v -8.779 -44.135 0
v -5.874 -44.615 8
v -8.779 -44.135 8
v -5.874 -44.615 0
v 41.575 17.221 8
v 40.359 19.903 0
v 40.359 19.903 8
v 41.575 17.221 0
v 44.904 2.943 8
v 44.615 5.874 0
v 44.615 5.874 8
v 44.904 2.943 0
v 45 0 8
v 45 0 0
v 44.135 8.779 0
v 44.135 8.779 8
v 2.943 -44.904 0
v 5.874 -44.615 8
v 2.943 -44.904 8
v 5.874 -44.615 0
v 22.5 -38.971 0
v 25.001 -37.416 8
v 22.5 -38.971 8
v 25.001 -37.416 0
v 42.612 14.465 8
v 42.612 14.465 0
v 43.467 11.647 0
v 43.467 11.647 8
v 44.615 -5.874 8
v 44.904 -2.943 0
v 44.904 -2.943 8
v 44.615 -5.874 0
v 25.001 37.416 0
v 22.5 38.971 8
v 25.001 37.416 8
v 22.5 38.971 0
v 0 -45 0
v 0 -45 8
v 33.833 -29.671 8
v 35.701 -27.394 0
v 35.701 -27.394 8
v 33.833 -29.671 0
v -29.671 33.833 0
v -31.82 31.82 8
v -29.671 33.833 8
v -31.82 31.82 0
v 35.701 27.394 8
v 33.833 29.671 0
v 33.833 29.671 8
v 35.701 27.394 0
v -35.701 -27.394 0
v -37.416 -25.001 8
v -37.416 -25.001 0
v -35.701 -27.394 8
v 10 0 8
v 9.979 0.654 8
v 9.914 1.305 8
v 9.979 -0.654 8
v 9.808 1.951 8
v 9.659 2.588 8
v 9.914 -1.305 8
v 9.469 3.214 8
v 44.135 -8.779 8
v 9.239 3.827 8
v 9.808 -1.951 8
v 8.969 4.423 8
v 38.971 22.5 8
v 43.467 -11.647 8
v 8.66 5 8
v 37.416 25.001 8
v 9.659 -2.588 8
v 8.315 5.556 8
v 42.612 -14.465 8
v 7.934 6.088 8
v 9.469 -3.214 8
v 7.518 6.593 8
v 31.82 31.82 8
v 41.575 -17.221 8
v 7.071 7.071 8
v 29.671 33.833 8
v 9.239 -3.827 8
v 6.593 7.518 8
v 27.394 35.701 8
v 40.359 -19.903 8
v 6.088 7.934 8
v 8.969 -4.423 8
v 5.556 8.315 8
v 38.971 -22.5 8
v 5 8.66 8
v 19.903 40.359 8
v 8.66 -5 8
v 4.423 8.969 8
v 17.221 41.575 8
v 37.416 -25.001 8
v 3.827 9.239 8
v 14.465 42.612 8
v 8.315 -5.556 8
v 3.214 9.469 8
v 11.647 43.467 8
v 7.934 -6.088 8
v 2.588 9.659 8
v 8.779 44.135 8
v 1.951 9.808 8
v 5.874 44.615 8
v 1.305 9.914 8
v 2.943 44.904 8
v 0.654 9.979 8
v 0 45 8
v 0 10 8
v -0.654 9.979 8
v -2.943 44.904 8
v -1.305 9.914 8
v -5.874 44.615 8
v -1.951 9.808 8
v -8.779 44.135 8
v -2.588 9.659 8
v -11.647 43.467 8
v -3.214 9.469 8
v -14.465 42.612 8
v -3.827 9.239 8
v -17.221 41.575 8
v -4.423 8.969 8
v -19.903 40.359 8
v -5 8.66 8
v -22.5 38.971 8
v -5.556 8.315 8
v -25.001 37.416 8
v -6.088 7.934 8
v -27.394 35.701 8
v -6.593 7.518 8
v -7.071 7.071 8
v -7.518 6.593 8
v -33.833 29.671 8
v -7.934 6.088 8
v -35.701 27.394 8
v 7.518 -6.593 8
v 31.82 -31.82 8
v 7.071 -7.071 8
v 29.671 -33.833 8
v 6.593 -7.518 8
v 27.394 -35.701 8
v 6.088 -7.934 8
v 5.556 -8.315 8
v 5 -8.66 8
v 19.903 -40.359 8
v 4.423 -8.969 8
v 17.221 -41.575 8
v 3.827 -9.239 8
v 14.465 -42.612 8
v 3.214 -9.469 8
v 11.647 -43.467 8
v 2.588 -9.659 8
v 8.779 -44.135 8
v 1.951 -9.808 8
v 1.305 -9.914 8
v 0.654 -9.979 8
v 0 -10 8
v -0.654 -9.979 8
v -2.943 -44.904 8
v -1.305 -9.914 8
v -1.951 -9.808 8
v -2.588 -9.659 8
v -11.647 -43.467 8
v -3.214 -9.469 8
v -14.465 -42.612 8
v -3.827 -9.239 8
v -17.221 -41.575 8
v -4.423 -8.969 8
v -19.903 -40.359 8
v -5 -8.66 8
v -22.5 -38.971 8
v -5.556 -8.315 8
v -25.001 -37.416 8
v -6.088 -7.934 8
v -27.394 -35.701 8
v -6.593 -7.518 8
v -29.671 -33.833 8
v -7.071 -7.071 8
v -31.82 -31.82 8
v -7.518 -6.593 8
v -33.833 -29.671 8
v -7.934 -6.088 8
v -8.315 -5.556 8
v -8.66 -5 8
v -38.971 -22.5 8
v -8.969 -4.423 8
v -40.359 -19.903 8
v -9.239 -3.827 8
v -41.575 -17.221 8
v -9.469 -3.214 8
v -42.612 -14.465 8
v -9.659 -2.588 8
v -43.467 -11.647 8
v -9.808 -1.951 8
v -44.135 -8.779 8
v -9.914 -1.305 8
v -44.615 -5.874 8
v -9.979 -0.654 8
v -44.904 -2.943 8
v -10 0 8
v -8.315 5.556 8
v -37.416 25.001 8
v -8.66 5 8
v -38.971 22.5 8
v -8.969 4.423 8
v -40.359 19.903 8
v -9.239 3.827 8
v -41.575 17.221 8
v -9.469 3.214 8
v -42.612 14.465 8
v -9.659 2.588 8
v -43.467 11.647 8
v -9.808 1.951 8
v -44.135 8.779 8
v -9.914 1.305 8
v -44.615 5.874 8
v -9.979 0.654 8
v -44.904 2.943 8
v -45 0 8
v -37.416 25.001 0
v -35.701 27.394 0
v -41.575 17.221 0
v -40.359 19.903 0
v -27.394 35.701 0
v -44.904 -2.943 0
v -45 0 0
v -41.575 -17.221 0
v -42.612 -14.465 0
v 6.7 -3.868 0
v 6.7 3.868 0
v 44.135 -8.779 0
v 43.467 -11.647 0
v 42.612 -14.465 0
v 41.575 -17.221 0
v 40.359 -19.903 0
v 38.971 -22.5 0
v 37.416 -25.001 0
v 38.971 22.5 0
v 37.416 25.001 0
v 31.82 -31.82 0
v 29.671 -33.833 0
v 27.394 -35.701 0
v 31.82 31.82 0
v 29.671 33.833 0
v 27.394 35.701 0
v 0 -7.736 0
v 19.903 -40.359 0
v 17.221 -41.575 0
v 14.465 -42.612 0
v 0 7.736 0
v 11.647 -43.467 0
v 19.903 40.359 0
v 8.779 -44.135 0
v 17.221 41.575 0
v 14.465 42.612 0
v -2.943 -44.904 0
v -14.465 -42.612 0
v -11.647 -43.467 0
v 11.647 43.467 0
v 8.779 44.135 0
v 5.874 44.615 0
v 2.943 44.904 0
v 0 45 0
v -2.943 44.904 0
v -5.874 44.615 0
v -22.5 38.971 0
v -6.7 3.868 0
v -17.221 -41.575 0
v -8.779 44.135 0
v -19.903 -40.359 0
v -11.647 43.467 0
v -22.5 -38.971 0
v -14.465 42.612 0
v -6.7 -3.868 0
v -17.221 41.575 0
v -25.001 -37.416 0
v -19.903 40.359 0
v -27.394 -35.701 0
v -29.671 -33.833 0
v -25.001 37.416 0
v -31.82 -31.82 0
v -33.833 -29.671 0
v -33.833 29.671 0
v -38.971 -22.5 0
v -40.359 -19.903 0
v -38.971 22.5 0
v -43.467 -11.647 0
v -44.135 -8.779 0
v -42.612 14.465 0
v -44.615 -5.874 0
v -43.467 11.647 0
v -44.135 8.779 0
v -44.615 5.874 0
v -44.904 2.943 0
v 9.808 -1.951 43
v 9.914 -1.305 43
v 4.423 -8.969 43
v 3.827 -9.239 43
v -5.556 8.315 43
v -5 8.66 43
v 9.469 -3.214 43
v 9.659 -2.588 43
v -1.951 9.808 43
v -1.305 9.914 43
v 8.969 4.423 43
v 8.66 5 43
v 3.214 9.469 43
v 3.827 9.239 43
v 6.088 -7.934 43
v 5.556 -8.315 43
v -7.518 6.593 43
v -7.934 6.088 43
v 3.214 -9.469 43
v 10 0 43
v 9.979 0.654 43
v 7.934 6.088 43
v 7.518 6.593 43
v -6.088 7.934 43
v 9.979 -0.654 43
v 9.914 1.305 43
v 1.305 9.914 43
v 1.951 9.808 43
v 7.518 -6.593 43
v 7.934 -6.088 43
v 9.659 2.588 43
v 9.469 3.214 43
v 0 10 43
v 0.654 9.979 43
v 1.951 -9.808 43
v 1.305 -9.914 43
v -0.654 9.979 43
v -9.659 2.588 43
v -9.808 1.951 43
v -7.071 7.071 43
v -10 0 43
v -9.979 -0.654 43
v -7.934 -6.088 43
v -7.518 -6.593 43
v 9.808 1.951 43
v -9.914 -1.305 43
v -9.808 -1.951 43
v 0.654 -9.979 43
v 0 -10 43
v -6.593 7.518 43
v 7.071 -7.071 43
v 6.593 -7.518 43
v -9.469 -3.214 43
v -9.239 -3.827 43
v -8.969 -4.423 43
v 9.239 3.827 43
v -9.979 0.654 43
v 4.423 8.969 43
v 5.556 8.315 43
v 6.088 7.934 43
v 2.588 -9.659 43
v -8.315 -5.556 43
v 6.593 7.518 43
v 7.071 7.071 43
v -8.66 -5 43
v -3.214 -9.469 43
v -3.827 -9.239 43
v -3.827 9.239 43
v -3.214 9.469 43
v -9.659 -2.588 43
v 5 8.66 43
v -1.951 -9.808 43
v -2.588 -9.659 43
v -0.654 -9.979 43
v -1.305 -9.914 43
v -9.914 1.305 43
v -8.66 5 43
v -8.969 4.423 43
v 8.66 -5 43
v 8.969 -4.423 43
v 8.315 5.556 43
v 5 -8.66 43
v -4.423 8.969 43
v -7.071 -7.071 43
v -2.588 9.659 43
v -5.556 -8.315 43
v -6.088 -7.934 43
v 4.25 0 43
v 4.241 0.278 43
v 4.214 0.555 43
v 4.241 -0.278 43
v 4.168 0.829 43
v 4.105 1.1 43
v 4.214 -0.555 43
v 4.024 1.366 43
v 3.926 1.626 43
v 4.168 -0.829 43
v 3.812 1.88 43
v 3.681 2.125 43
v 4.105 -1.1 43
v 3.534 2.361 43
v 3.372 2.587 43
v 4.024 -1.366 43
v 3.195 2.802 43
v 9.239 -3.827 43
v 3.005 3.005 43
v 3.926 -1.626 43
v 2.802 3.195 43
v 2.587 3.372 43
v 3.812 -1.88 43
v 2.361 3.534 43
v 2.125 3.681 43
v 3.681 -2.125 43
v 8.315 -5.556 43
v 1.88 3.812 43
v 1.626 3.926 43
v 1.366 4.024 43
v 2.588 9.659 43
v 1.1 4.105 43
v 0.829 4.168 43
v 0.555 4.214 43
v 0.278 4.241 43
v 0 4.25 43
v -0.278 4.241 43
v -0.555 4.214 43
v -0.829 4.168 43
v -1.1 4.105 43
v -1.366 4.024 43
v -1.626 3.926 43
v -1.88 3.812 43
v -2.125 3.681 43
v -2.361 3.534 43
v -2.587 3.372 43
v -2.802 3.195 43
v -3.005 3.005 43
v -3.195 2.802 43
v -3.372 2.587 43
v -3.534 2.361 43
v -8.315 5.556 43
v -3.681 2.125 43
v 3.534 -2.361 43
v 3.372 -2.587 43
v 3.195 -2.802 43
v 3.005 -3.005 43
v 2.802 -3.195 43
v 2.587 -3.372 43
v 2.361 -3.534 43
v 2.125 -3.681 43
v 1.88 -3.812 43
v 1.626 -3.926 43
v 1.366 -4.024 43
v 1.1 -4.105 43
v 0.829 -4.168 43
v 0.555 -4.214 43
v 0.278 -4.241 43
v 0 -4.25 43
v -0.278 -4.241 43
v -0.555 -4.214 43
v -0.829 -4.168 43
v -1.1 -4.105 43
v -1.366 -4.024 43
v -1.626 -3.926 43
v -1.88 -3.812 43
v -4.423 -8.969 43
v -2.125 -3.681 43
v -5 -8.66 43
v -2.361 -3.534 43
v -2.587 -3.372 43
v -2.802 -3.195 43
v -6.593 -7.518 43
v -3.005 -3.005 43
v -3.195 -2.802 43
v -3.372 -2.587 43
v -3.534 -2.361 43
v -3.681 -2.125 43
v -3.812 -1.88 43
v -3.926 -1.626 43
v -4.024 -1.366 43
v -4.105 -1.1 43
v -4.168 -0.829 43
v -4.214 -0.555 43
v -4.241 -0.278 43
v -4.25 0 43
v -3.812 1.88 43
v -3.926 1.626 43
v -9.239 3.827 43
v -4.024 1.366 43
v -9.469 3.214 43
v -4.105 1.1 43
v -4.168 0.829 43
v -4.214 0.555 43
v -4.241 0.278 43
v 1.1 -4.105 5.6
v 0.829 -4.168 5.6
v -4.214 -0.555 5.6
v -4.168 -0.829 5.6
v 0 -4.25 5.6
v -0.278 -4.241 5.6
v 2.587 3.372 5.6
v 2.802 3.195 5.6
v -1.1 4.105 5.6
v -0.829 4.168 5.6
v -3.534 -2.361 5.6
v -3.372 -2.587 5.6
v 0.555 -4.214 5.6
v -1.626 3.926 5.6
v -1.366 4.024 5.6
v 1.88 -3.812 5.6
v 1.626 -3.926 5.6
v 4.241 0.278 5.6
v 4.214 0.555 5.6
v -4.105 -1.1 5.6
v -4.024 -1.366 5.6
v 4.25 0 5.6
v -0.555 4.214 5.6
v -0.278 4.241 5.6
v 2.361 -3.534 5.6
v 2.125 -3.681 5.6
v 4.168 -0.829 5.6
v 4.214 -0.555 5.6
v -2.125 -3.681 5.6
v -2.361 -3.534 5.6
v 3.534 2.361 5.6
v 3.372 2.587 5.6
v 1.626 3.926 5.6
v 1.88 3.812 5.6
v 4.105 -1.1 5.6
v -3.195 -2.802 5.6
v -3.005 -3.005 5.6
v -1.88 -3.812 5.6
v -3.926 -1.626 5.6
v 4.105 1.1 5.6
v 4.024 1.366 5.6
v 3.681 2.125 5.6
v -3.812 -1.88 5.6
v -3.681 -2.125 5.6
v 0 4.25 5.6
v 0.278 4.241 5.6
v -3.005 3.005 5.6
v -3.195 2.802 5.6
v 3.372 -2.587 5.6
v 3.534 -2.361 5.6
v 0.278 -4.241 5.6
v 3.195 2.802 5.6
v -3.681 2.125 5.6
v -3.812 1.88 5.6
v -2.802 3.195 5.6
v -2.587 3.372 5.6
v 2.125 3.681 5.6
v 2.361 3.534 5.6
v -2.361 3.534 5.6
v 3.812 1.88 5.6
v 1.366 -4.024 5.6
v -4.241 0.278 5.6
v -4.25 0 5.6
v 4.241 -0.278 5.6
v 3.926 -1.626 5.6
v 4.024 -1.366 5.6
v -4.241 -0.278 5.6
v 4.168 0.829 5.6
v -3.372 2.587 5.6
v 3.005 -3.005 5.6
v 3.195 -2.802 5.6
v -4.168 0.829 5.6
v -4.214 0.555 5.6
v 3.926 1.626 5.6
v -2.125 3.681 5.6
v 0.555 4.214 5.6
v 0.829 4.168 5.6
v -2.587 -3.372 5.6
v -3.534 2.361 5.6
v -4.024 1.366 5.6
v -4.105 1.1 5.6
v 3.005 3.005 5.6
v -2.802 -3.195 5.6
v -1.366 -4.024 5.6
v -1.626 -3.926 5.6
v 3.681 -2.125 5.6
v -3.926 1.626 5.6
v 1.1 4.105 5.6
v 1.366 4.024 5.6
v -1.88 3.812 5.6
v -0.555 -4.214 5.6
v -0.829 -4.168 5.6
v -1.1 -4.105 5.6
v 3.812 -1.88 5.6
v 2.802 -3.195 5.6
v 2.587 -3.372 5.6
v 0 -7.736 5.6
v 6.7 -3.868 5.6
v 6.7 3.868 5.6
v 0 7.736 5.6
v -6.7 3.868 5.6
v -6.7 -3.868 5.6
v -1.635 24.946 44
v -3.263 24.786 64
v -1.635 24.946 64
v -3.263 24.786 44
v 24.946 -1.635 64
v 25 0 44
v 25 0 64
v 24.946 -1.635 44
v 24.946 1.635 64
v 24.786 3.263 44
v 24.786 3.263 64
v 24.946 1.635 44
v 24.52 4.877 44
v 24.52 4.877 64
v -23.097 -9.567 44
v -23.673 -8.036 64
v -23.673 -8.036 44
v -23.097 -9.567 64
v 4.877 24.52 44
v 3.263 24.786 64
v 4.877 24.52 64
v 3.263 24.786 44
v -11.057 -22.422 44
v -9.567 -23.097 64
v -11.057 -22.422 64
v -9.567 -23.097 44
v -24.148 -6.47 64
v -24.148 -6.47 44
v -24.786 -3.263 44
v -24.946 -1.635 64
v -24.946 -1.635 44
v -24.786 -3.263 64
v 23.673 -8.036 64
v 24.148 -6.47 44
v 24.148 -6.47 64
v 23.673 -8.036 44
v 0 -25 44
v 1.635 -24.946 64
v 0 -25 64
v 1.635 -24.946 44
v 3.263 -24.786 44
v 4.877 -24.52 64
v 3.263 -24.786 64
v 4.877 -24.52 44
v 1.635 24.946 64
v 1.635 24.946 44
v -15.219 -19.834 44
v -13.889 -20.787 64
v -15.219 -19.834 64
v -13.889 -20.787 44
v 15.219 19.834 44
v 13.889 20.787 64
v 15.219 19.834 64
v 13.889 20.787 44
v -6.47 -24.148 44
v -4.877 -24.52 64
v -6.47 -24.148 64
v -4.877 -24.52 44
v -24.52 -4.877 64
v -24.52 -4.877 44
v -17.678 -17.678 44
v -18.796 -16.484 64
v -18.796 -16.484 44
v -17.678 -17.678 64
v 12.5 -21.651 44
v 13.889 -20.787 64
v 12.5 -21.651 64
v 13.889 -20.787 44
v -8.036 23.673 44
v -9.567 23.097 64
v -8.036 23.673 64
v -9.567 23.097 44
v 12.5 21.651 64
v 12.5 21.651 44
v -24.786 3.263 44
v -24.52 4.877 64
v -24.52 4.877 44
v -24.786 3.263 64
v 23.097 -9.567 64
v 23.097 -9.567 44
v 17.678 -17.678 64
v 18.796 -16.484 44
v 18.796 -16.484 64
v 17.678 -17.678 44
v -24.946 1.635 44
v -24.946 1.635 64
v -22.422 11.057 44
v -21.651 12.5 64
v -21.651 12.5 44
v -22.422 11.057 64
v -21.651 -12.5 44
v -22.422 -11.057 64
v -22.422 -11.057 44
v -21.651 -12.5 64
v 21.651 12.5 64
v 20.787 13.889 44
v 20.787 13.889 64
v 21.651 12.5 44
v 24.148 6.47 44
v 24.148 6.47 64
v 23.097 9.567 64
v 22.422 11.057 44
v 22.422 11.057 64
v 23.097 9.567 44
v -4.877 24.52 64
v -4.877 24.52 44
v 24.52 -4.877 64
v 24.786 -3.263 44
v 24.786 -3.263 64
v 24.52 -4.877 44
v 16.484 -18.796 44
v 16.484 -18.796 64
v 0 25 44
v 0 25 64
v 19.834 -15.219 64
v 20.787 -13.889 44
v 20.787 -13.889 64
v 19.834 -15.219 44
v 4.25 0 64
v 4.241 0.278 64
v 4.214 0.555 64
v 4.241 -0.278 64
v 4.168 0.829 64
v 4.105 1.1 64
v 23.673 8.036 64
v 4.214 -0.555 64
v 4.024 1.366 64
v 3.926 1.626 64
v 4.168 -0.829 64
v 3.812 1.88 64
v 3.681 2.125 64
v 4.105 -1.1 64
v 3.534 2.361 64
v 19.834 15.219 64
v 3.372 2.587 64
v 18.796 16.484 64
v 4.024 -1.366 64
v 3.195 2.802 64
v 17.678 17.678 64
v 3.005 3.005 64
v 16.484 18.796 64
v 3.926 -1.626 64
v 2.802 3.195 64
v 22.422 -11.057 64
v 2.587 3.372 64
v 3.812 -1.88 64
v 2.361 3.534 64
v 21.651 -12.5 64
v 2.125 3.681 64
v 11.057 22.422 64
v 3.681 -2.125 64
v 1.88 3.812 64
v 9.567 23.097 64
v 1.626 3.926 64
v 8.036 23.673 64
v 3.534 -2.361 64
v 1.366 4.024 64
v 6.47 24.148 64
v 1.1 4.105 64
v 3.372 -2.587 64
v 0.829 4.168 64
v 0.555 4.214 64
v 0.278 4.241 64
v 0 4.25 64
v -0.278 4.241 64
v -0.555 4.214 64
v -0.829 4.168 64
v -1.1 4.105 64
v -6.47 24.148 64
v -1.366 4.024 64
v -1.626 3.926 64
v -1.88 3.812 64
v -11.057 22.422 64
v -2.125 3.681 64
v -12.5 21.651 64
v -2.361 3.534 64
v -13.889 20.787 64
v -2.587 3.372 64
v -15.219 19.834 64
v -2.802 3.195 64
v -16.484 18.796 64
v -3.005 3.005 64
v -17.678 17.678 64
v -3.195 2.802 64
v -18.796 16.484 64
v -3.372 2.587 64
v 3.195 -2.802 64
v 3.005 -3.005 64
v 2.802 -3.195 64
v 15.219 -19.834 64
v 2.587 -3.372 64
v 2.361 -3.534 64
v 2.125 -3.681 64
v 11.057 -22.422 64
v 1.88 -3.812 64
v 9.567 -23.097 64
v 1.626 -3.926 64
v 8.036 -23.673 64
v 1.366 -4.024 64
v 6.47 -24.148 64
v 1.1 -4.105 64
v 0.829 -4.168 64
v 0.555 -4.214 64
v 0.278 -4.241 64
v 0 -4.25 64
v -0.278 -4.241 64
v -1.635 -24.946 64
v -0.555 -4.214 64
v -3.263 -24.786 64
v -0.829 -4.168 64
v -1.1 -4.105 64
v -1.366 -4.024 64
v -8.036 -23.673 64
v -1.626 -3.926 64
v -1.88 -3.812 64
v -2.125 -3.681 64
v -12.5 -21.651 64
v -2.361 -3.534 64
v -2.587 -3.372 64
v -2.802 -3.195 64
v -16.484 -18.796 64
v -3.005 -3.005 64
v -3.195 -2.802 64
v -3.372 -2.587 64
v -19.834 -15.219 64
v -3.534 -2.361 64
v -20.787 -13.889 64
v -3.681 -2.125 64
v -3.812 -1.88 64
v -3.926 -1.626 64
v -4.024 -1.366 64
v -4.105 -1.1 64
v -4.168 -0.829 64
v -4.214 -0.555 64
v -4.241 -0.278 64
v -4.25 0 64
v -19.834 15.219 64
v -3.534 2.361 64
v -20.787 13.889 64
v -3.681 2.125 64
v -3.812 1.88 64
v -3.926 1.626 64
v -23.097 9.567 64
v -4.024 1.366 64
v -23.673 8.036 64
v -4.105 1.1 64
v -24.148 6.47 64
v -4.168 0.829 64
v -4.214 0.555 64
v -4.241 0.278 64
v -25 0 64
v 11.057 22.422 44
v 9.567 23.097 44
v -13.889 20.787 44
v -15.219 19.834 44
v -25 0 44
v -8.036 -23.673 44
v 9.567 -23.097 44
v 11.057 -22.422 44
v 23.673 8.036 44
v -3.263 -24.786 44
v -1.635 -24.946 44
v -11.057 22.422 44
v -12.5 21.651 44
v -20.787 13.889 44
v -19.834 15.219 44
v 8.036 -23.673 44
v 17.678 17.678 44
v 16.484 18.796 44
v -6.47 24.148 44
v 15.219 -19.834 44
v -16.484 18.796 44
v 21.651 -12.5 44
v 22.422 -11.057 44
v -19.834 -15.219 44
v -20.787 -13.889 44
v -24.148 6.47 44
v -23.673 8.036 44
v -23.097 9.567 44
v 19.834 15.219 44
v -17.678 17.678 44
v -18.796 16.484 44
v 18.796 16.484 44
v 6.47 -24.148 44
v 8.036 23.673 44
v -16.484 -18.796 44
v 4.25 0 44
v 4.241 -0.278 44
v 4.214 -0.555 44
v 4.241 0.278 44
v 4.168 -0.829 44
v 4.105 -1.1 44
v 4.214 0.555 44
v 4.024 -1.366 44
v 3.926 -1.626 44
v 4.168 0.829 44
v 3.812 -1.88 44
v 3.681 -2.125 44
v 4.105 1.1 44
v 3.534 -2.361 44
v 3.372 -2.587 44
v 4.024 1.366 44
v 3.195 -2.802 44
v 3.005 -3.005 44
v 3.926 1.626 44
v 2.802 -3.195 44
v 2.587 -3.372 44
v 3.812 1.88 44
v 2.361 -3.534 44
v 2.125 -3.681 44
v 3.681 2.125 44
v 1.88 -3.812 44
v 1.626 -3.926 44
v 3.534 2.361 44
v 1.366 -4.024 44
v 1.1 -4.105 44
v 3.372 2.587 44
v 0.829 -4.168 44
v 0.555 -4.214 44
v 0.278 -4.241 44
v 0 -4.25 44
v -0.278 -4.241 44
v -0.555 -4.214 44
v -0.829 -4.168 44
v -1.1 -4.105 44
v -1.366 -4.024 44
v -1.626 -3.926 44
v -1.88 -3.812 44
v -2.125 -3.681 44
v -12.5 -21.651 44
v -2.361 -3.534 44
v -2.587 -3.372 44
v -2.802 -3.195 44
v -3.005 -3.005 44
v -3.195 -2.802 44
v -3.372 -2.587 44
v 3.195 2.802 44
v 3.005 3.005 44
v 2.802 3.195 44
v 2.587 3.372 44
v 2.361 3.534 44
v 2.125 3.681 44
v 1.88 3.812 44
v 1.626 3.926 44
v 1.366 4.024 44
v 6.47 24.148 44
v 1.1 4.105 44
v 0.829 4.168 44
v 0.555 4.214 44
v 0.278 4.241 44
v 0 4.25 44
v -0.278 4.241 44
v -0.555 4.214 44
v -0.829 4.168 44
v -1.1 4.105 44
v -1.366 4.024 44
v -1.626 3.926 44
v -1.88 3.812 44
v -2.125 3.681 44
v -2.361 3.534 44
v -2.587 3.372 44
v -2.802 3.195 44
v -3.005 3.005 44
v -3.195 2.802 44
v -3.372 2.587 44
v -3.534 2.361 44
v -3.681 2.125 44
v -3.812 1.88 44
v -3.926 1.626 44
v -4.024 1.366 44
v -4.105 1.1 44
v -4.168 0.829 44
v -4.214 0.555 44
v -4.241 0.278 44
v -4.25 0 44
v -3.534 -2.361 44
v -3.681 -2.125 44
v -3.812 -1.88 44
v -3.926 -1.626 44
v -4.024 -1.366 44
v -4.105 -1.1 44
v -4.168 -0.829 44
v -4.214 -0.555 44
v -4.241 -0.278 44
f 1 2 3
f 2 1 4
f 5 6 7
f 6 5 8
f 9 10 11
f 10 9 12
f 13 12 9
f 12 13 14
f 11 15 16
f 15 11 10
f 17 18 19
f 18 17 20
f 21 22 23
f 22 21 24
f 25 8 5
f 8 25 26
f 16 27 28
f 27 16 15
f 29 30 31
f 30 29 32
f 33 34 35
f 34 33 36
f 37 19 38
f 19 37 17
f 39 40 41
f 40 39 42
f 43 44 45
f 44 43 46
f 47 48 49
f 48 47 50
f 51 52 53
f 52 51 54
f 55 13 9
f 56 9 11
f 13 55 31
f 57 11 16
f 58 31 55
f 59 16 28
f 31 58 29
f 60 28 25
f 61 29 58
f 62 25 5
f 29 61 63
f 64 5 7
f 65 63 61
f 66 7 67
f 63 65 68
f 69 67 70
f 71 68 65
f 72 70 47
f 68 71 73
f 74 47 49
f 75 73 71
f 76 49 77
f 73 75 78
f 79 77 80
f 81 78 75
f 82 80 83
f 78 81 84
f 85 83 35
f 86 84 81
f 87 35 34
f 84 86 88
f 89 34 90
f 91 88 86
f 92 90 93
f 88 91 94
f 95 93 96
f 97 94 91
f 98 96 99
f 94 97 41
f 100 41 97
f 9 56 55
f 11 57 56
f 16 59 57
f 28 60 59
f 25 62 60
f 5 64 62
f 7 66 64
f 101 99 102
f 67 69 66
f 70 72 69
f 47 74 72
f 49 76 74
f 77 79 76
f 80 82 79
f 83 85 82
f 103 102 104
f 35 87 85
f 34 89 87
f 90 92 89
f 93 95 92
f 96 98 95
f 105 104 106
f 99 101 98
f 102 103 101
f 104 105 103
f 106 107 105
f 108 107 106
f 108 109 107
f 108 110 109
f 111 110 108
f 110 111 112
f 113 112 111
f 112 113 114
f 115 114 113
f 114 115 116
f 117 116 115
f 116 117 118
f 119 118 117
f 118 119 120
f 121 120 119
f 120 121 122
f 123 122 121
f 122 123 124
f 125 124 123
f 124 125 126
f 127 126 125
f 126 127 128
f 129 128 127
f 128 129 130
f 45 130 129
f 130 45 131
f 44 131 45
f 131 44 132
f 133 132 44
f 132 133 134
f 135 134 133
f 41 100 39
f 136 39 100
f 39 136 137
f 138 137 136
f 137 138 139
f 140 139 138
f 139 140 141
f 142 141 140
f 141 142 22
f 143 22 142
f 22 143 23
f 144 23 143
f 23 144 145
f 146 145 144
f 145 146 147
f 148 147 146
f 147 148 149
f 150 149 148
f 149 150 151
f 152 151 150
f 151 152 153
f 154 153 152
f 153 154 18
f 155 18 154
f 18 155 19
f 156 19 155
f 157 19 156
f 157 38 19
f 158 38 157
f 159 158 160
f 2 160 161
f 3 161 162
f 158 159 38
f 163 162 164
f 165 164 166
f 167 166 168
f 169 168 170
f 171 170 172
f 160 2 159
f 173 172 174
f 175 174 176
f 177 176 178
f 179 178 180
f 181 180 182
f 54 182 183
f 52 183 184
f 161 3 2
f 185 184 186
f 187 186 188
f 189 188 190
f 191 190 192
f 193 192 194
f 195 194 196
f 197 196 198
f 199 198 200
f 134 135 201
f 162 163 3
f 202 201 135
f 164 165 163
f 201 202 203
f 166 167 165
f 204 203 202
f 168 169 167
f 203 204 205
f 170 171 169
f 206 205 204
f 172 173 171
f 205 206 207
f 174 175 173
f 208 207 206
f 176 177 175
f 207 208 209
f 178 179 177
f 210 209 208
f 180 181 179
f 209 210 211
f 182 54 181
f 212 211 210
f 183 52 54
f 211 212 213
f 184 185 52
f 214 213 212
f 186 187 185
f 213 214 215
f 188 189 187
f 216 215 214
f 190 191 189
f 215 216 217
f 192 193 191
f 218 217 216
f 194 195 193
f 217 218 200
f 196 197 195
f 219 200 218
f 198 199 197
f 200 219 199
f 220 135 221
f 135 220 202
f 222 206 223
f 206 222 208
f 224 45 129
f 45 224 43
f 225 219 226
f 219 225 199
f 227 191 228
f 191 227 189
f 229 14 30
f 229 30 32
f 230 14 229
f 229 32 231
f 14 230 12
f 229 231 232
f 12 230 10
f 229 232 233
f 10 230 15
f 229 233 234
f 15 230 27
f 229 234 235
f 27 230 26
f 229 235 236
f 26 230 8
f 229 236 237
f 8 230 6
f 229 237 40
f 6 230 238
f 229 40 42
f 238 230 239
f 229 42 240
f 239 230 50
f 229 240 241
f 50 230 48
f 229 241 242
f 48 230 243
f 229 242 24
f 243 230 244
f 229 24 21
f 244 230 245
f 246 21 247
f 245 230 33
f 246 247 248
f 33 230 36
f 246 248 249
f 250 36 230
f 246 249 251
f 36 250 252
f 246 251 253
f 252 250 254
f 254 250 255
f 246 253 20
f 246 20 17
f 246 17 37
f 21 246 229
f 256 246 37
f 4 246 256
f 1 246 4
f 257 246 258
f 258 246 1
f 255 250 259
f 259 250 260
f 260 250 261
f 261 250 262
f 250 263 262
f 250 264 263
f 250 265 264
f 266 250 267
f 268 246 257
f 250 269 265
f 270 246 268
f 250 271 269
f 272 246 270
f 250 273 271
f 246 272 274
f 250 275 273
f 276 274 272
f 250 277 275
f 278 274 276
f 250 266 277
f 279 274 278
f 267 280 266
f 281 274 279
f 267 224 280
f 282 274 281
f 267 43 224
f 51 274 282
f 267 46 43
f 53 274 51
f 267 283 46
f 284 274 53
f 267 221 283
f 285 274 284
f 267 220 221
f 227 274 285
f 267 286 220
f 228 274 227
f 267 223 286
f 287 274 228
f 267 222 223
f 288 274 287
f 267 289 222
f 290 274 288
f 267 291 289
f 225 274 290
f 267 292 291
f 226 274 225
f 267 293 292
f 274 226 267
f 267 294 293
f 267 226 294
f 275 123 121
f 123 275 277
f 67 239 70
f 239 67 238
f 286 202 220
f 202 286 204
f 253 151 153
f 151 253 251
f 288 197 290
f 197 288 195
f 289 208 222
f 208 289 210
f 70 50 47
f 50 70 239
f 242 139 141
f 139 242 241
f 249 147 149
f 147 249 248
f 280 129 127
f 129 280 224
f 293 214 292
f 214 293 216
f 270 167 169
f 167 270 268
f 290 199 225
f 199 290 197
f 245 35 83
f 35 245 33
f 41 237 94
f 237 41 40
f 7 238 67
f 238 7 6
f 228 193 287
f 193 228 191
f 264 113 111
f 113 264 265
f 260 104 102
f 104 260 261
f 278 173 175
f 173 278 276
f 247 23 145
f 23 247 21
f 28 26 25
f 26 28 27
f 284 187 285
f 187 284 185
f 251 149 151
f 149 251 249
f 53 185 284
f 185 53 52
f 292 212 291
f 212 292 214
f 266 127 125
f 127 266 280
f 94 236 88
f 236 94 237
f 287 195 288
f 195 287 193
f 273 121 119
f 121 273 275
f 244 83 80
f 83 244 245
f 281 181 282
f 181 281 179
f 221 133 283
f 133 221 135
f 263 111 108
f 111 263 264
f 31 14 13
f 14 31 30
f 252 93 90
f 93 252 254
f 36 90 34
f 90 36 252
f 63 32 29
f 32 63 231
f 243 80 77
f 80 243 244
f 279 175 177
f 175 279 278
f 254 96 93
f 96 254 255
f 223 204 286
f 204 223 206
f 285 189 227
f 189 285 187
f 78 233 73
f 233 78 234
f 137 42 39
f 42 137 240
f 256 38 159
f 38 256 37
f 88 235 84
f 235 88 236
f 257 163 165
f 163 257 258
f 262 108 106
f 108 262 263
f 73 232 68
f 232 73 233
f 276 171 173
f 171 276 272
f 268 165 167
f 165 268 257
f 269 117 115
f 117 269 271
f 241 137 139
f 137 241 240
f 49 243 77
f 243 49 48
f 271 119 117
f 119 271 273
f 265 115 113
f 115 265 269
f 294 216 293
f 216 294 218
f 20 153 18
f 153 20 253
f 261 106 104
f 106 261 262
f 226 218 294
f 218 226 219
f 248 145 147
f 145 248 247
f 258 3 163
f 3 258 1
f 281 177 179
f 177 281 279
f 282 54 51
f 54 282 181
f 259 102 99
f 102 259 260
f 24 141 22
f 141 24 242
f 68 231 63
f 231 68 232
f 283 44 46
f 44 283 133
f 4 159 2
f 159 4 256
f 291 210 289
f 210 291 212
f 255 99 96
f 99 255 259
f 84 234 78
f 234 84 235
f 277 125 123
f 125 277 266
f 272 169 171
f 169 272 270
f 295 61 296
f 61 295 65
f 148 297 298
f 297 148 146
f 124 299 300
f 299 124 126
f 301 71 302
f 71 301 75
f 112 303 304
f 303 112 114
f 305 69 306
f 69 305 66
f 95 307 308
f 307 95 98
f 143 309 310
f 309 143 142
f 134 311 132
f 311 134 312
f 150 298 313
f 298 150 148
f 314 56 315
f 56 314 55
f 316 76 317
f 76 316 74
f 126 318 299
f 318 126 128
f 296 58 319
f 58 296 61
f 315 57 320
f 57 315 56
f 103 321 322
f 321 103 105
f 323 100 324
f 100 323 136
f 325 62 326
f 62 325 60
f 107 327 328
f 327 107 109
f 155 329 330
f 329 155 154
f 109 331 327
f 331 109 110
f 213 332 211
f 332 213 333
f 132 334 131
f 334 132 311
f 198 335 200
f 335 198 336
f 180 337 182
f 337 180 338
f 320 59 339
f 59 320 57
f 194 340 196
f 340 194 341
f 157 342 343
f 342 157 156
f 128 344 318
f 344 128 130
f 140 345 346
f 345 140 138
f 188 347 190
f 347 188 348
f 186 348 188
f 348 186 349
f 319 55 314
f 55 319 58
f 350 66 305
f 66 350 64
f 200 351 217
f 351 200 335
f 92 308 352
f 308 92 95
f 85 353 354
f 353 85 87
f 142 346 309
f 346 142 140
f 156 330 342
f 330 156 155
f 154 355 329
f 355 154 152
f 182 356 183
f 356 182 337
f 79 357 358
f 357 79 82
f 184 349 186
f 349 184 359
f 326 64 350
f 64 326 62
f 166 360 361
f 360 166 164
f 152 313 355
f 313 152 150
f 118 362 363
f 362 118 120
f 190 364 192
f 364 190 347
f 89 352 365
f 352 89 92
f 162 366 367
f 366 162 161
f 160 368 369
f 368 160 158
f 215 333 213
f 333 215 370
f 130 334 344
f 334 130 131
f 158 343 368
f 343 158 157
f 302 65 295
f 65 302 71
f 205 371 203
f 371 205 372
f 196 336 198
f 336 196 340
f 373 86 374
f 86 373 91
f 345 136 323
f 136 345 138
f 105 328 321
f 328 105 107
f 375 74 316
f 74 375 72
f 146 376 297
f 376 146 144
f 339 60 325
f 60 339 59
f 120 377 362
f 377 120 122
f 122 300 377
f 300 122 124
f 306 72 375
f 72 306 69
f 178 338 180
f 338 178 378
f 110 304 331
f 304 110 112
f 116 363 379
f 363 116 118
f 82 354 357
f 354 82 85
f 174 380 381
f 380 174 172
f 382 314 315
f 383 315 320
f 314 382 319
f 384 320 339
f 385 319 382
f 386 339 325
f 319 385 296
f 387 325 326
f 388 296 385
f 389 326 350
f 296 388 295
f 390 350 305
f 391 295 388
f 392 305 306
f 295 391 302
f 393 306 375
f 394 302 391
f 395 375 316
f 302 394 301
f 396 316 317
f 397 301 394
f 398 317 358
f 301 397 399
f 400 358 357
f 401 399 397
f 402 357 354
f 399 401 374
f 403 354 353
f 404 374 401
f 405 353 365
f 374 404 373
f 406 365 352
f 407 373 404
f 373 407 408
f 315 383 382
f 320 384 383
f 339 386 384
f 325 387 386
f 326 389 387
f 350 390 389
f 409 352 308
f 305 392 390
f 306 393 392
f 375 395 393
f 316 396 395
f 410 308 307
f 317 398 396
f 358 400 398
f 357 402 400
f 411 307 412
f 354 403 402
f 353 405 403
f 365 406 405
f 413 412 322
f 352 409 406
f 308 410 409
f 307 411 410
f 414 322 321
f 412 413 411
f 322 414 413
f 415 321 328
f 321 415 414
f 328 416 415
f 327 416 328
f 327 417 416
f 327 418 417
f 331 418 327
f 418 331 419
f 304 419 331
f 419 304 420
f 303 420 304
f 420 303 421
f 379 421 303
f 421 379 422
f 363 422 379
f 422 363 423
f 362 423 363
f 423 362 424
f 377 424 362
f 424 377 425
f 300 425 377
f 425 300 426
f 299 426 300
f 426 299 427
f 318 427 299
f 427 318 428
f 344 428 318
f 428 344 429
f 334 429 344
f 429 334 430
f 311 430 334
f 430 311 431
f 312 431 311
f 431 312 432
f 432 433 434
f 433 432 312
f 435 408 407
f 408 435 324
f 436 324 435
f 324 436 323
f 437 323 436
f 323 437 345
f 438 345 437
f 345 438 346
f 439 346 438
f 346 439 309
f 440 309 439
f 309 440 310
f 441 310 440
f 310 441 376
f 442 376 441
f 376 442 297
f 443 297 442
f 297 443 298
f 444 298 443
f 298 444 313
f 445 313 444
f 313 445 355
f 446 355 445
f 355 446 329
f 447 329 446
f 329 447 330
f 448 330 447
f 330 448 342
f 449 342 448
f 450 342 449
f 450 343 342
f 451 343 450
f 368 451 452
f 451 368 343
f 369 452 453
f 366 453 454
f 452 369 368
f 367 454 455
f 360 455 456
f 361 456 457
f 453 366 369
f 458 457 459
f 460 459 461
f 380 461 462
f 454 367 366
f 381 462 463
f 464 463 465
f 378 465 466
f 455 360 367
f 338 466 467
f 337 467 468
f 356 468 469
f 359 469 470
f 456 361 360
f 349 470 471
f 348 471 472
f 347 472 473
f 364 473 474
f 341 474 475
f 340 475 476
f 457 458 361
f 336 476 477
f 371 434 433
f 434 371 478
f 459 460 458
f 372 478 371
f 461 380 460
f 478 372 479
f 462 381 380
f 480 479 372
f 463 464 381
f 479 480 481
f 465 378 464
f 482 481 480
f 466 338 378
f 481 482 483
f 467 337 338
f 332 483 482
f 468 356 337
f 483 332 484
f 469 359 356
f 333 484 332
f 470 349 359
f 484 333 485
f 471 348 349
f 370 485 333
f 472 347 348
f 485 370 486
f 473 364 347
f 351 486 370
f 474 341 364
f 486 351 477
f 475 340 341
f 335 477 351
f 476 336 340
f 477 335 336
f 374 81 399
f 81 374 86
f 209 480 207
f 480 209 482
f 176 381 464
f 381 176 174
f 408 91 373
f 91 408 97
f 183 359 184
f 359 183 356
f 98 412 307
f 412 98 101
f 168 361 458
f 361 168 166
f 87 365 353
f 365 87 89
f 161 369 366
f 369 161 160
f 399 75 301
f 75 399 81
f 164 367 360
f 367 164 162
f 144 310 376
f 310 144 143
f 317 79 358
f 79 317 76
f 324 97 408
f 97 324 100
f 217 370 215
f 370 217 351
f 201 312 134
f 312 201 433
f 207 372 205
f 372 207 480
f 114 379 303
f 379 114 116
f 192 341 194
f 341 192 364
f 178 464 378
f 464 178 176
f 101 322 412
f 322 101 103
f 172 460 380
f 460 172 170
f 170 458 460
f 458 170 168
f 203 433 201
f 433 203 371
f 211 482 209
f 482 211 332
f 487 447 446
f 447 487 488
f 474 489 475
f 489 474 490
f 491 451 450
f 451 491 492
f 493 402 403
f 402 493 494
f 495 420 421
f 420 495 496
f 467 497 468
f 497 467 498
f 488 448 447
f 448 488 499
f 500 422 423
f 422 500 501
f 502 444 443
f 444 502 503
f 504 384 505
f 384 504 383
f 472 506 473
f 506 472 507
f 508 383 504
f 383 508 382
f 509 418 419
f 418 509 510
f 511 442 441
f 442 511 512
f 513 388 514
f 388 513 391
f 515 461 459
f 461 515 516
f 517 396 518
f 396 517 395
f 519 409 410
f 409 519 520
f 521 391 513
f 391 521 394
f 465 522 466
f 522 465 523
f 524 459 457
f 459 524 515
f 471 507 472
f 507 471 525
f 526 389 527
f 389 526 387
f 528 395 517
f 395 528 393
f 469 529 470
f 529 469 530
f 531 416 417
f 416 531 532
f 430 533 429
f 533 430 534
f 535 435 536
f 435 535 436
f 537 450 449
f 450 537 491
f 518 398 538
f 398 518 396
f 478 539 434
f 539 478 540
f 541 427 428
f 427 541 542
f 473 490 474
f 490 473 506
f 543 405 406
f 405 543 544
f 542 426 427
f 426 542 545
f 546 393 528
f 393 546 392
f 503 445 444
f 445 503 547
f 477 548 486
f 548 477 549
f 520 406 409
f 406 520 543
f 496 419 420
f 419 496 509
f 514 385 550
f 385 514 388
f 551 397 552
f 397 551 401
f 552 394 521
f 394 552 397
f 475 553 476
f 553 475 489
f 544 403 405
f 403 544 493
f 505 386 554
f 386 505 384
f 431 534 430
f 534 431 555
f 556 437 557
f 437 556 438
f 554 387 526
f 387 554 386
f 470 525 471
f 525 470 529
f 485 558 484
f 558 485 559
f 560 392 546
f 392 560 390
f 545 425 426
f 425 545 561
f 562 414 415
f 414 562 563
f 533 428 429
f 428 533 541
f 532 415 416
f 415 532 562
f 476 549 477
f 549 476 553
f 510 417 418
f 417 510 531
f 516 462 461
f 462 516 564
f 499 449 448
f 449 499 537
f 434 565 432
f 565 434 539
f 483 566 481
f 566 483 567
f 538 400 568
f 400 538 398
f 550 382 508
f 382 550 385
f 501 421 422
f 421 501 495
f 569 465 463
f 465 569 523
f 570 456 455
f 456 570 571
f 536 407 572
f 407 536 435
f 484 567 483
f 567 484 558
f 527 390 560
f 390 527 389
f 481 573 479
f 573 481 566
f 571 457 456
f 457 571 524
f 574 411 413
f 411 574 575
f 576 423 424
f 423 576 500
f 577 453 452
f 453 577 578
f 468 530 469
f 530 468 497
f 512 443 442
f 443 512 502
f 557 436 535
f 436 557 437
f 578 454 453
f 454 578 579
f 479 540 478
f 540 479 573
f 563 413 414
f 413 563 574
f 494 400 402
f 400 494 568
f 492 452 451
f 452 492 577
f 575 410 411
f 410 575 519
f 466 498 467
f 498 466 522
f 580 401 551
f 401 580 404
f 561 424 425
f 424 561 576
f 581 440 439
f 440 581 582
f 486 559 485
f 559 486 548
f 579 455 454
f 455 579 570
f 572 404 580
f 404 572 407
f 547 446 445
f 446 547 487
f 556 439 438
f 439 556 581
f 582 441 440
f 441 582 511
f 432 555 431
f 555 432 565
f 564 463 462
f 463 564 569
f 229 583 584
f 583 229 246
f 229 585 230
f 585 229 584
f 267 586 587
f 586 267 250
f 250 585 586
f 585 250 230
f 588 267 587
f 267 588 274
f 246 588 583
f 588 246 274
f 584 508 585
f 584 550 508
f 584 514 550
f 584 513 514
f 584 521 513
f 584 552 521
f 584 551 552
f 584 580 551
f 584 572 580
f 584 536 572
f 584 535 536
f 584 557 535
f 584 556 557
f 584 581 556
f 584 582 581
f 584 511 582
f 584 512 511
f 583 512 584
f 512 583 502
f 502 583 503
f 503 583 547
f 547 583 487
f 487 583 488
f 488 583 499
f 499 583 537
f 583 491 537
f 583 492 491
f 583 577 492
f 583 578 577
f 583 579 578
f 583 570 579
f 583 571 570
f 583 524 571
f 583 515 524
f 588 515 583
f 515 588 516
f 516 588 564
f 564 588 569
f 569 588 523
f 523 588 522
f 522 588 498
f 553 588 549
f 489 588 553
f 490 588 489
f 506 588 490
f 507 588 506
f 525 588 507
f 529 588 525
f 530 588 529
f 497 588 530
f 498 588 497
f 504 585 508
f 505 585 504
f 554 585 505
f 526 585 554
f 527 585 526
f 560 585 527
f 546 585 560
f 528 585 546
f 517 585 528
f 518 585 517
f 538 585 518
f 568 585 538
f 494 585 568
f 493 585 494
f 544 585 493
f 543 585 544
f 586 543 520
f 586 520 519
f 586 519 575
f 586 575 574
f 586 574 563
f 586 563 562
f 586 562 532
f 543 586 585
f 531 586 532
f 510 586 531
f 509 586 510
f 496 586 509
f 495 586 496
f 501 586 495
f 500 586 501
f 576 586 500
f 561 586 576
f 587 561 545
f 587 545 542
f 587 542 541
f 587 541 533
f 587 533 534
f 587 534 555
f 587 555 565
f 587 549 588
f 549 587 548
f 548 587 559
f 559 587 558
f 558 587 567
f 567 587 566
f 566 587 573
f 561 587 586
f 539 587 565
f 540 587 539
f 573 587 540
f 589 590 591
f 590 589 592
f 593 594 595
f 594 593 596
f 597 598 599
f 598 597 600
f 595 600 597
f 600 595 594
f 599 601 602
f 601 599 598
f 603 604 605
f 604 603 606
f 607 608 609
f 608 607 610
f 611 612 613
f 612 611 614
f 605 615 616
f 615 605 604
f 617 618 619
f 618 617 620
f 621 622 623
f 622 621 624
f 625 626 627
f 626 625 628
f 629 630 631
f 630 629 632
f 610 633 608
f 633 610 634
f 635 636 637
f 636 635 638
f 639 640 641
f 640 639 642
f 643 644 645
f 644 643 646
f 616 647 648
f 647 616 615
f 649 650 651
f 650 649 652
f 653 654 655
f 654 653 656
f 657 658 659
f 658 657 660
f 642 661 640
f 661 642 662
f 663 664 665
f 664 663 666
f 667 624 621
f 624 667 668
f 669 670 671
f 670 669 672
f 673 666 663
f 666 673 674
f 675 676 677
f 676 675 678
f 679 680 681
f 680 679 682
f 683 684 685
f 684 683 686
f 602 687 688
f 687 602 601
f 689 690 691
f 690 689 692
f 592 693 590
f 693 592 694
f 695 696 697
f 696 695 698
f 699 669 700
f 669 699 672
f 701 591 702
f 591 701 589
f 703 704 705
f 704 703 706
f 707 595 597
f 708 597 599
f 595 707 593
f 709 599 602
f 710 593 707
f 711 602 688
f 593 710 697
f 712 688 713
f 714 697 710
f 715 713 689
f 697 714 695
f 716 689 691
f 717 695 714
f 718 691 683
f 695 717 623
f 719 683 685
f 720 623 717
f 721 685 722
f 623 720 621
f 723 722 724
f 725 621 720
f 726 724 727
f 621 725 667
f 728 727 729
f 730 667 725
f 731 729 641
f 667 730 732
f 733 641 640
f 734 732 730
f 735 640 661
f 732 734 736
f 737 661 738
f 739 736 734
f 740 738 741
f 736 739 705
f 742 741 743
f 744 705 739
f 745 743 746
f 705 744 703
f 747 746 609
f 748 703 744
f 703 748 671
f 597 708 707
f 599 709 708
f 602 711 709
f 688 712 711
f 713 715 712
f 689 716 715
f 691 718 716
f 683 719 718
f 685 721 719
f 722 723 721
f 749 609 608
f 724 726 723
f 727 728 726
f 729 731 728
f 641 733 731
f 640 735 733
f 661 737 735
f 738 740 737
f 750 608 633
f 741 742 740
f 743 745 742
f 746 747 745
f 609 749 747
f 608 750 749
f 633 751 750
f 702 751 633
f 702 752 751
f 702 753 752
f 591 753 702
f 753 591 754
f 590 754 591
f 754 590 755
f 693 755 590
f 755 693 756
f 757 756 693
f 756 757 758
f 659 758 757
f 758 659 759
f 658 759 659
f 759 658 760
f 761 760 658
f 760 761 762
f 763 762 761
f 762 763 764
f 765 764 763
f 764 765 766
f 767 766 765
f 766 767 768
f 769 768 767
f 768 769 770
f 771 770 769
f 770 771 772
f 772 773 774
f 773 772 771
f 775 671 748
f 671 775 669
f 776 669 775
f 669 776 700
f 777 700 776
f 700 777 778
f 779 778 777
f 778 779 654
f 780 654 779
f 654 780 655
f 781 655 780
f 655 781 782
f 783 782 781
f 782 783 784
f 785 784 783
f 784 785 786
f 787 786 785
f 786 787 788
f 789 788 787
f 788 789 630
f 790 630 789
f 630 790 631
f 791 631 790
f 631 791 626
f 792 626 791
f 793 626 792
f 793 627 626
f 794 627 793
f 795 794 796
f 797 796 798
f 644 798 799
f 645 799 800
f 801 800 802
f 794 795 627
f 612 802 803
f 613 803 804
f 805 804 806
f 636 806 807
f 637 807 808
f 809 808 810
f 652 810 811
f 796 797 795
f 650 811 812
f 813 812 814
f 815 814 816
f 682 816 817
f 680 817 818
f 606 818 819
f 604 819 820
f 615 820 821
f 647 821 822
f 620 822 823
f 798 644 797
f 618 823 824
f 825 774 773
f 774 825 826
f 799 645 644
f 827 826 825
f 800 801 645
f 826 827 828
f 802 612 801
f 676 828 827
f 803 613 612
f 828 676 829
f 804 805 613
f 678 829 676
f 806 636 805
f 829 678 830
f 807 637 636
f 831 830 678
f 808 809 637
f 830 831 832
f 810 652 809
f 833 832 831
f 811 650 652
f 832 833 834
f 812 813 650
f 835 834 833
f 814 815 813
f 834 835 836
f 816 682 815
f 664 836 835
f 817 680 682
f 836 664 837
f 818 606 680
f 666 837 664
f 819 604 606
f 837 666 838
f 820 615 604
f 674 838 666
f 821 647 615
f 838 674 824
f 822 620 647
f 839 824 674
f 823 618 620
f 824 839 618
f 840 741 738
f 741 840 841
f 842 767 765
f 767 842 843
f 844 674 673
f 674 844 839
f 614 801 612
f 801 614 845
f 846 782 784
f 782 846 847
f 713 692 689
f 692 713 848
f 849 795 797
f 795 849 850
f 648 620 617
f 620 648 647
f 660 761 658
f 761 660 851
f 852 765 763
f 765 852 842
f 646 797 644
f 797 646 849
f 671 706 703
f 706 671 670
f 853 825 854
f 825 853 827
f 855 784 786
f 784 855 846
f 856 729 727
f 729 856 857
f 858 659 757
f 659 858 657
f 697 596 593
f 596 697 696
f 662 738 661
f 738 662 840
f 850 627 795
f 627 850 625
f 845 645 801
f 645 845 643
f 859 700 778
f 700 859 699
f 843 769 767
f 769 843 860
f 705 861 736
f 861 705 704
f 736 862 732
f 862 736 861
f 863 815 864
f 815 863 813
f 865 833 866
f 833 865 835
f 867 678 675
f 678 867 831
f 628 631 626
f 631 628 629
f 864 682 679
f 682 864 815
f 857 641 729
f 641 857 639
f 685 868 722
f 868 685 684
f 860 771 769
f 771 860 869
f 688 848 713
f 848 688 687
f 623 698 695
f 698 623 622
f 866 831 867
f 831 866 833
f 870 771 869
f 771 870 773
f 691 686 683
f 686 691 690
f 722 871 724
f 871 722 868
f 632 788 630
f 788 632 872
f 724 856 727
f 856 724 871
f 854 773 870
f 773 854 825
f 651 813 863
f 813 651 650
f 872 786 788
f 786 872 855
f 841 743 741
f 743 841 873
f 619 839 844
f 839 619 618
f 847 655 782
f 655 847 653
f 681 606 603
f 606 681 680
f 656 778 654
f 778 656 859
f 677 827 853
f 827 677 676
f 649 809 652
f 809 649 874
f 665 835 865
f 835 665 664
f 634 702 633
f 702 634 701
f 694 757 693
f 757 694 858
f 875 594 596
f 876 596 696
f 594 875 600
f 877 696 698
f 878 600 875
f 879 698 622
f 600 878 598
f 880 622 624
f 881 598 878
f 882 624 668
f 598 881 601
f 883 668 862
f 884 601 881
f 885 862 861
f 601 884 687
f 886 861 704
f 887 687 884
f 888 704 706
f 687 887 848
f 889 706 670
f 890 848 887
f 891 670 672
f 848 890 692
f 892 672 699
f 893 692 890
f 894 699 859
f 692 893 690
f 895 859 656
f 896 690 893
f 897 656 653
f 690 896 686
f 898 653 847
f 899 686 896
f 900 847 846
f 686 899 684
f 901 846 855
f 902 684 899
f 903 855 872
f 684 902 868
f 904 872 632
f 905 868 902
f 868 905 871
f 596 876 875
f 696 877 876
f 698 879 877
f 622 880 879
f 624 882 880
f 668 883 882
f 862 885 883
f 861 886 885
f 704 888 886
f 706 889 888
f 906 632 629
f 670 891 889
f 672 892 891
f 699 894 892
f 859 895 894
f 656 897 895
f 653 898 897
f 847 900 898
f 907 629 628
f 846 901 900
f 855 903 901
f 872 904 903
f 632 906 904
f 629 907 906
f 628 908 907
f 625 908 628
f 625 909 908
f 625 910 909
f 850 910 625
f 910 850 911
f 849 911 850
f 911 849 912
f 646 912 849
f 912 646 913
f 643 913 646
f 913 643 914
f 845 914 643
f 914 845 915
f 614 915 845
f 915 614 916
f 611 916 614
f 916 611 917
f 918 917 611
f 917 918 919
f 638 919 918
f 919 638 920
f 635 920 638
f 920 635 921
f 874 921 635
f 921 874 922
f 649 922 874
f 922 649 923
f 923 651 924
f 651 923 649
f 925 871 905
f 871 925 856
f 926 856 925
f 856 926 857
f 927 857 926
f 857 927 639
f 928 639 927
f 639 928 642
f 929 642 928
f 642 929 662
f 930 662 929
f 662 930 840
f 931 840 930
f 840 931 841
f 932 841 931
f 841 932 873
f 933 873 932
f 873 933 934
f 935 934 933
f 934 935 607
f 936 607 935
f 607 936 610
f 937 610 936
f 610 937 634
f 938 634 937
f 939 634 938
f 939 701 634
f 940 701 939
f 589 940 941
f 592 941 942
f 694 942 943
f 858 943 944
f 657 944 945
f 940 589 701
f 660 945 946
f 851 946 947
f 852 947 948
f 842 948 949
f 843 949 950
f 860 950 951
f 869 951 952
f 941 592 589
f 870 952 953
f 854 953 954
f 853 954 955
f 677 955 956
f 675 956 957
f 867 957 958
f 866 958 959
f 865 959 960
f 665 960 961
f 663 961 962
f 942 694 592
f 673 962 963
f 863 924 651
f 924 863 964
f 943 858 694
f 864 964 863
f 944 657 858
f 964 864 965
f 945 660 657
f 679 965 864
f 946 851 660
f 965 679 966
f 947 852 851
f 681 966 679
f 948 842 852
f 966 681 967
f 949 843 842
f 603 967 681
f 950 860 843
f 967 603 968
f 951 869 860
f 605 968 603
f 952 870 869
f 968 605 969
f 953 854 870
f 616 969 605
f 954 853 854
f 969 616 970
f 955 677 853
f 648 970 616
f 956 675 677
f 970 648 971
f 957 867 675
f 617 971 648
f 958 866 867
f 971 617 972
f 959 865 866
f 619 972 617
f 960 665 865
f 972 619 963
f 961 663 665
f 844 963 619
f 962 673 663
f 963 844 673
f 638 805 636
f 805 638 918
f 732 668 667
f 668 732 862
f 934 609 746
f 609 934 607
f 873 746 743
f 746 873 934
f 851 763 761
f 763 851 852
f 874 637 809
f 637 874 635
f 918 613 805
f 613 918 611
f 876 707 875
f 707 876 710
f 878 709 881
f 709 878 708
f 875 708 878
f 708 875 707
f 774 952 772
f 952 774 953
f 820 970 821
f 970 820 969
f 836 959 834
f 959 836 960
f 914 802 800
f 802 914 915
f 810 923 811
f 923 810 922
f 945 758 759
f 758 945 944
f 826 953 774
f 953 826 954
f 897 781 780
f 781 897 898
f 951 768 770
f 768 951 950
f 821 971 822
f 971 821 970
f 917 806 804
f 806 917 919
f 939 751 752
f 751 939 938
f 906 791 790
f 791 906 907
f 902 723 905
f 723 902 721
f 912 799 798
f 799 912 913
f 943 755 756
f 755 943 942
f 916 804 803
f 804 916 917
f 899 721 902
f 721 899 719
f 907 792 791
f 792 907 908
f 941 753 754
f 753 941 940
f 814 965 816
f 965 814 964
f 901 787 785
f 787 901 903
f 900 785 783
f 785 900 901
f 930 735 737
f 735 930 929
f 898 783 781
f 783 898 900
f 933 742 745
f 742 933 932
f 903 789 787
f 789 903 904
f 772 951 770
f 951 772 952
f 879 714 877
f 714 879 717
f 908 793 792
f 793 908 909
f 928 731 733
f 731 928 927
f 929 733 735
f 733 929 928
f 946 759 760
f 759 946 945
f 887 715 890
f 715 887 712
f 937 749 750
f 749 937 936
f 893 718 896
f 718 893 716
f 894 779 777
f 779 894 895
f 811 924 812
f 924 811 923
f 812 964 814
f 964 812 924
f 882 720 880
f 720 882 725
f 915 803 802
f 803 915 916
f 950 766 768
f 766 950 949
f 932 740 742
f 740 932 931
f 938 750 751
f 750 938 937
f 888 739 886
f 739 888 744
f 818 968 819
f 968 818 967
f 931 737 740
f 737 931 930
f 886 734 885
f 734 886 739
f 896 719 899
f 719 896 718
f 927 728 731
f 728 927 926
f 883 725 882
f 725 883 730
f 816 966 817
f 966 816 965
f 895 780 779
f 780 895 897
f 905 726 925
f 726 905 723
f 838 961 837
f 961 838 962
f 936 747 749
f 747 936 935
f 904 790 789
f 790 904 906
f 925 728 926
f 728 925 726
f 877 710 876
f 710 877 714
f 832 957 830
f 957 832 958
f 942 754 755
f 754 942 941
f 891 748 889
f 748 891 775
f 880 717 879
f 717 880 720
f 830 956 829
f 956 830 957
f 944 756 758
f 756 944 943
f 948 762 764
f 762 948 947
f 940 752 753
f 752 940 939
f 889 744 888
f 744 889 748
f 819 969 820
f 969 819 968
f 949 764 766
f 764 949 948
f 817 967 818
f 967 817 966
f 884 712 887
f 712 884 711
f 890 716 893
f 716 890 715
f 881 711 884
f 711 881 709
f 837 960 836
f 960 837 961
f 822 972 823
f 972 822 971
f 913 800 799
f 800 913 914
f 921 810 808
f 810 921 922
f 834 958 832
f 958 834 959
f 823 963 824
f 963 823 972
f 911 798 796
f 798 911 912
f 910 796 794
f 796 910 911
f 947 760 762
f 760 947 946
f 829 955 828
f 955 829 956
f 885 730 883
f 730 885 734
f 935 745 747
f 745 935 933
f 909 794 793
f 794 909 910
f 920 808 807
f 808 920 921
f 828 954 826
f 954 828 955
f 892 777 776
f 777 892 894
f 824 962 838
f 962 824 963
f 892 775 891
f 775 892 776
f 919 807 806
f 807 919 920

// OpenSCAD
// Units: mm. No printed threads. Edit source JSON and rebuild to keep sim aligned.
// openscad -o base.stl -D 'part="base"' fixture.scad
part = "assembly"; // base, rotor_round, rotor_hex, assembly
$fn = 96;
r = 25.0; h = 20.0; bore = 4.25;
flange_r = 45.0; flange_h = 8.0;
post_r = 10.0; post_h = 35.0;
head_af = 13.4; head_h = 5.6;
gap = 1.0;
module base() { difference() {
    union() { cylinder(r=flange_r,h=flange_h); translate([0,0,flange_h]) cylinder(r=post_r,h=post_h); }
    translate([0,0,-0.1]) cylinder(r=bore,h=flange_h+post_h+0.2);
    translate([0,0,-0.1]) rotate([0,0,30]) cylinder(r=head_af/sqrt(3),h=head_h+0.1,$fn=6);
} }
module rotor(hex=false) { difference() {
    if (hex) rotate([0,0,30]) cylinder(r=r,h=h,$fn=6); else cylinder(r=r,h=h);
    translate([0,0,-0.1]) cylinder(r=bore,h=h+0.2);
} }
if (part=="base") base();
else if (part=="rotor_round") rotor();
else if (part=="rotor_hex") rotor(true);
else { base(); translate([0,0,flange_h+post_h+gap]) rotor(); }
